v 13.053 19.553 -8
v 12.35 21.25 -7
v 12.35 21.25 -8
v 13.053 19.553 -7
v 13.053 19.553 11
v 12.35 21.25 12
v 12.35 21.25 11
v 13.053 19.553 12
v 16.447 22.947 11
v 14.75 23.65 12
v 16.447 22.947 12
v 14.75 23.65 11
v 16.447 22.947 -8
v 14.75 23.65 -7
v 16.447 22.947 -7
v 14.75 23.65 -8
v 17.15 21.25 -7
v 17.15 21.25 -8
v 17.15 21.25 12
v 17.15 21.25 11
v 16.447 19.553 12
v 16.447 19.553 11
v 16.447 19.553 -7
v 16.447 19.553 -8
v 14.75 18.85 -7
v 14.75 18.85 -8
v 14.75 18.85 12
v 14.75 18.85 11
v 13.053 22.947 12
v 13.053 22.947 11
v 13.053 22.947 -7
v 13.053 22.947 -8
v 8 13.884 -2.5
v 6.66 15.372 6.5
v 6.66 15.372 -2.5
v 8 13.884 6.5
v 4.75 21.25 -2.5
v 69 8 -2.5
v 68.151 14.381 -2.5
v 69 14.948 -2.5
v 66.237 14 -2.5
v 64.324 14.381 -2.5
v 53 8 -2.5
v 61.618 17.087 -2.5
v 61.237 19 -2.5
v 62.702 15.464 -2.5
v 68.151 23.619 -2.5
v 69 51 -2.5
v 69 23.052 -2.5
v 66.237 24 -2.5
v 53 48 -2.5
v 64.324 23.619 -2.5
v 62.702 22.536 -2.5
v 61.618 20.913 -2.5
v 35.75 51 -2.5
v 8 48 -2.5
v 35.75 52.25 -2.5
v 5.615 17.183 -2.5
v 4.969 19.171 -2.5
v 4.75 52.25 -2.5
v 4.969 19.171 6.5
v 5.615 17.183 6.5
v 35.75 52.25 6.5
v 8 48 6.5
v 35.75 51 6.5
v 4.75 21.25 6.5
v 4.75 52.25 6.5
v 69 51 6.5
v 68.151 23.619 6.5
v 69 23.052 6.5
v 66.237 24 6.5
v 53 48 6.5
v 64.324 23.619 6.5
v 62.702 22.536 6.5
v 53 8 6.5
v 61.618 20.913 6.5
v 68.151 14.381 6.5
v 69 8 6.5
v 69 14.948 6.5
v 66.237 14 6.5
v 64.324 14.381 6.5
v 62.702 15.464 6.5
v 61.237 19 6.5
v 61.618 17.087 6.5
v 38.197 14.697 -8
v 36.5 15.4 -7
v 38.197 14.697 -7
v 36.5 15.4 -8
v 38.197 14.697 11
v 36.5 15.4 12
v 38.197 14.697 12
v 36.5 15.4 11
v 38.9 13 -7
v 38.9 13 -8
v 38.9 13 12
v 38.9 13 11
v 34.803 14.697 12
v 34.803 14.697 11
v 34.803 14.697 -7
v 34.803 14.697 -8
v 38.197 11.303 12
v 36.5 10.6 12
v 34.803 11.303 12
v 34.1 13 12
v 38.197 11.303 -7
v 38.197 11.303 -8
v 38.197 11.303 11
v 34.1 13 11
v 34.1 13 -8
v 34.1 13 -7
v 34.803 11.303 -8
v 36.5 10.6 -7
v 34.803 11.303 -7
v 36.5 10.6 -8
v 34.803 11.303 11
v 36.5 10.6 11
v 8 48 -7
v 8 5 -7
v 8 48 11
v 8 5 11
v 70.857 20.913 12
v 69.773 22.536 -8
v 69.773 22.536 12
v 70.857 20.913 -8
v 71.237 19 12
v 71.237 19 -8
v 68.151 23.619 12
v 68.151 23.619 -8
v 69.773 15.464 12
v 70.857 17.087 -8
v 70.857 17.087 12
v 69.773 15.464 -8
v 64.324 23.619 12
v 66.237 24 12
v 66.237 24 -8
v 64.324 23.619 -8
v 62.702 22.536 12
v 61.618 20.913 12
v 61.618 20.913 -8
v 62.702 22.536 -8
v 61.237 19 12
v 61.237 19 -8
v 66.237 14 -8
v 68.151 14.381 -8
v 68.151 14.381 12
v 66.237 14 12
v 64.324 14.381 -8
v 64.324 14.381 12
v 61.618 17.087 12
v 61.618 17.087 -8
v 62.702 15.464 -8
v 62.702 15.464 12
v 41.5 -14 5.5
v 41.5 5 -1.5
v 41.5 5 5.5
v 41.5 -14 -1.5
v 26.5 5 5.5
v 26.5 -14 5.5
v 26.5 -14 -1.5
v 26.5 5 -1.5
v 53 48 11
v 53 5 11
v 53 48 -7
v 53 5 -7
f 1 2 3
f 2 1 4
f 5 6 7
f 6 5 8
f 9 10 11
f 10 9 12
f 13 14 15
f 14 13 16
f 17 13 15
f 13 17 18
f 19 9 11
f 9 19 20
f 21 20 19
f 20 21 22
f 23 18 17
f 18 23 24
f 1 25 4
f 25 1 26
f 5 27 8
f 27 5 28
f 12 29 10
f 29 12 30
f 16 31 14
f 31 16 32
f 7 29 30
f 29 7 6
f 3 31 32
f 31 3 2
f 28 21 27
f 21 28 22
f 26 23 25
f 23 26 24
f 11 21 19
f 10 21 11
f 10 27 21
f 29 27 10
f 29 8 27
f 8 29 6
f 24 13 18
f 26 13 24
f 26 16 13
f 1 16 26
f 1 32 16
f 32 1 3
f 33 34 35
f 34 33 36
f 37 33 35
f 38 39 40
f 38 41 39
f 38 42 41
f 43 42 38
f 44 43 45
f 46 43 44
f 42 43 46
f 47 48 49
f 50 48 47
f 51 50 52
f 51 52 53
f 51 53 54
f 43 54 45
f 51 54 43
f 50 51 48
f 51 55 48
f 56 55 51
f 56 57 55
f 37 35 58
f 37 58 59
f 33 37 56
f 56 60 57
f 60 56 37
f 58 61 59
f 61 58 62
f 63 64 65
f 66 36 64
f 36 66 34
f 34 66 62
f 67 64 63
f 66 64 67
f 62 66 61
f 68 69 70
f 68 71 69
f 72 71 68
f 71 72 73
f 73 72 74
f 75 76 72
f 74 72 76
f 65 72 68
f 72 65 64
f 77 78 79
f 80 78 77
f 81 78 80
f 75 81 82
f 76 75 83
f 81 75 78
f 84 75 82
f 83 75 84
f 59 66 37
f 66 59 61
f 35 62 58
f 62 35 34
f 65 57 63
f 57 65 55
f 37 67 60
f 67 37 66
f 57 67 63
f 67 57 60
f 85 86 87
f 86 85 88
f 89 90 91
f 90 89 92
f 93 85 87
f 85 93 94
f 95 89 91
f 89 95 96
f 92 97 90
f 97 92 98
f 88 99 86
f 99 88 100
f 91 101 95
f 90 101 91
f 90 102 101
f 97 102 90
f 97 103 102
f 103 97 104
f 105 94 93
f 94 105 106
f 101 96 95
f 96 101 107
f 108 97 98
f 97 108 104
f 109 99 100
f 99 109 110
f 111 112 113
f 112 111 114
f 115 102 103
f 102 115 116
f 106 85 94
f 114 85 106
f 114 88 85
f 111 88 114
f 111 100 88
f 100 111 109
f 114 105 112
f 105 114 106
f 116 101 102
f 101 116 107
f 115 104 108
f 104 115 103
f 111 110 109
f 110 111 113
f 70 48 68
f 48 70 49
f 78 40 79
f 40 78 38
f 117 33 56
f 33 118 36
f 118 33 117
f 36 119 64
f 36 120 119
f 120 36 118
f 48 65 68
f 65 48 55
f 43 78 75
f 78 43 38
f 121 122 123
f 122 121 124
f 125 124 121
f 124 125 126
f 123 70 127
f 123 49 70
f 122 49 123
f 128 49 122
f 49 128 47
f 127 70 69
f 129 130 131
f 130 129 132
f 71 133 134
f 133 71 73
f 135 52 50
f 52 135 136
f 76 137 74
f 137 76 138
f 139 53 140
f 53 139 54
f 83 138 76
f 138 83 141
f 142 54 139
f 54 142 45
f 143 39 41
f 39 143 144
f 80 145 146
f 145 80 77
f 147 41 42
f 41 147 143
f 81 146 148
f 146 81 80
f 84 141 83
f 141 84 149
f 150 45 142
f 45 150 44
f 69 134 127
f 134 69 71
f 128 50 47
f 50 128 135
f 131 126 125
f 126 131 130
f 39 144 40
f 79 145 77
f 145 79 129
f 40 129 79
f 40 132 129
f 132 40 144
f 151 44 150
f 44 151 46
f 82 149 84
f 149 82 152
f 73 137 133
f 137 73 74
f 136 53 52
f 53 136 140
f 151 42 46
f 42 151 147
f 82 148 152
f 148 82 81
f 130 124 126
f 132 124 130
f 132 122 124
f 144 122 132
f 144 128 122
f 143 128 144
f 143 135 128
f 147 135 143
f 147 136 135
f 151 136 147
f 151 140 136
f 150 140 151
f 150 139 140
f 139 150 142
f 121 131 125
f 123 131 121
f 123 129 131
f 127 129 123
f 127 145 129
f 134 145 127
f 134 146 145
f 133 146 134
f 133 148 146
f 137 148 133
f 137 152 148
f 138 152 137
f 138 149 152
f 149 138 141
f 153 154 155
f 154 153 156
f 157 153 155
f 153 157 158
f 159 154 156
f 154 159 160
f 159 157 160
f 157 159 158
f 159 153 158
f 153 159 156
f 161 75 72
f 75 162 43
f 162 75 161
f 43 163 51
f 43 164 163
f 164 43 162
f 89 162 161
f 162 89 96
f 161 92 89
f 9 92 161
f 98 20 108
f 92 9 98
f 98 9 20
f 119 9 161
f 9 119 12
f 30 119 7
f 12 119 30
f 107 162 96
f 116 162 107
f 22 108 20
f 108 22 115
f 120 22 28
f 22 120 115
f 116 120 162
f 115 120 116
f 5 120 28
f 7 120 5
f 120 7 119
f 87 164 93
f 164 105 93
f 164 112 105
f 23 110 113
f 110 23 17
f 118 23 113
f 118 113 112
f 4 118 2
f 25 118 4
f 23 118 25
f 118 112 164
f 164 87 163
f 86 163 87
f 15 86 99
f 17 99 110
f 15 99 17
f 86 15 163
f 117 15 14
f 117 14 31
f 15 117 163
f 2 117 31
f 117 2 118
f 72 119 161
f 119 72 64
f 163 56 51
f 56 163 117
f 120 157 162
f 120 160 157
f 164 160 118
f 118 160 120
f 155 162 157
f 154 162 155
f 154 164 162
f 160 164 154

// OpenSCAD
module AR15_Trigger(pinWidth=20,
                   triggerPin=true, hammerPin=true,
                   selector=true,
                   triggerHole=false,
                   triggerPocketModifier=0) {

  pinRadius = 2.4; // 0.1560*25.4/2;

  frontPinOffsetX = 6.75;
  frontPinOffsetY = 16.25;

  rearPinOffsetX = 28.5;
  rearPinOffsetY = 8;

  selectorRadius = 5; // Diameter: .3760" = 9.55mm
  selectorOffsetX = frontPinOffsetX+(1.968*25.4) + 1.5;
  selectorOffsetY = 14;

  hammerLength = 41 + triggerPocketModifier;
  hammerWidth  = 9  + triggerPocketModifier;
  hammerPivotRadius = 10 + triggerPocketModifier;

  triggerWidth      = 7;

  triggerPocketHeight = 43 + triggerPocketModifier;
  triggerPocketWidth  = 18 + triggerPocketModifier;
  triggerPocketLength = 45 + triggerPocketModifier;

  render()
  translate([0,0,0])
  //rotate([90,0,0])
  difference() {
    union() {

      // Trigger pack body
      translate([0,0,-triggerPocketWidth/2])
      cube([triggerPocketLength,triggerPocketHeight,triggerPocketWidth]);

      translate([0,0,0]) {

        // Pins and hammer path
        translate([frontPinOffsetX,frontPinOffsetY,0]) {

          // Hammer pin
          if (hammerPin)
          cylinder(r=pinRadius, h=pinWidth, center=true);

          // Hammer pivot
          cylinder(r=hammerPivotRadius, h=hammerWidth, center=true);

          // Hammer travel
          translate([-hammerPivotRadius,0,-hammerWidth/2])
          cube([hammerLength-hammerPivotRadius,hammerLength-hammerPivotRadius,hammerWidth]);
        };

        // Trigger pin
        if (triggerPin)
        translate([rearPinOffsetX,rearPinOffsetY,0])
        cylinder(r=pinRadius, h=pinWidth, center=true);

        // Sear Extension
        translate([0,3,0-hammerWidth/2])
        cube([triggerPocketLength+16,triggerPocketHeight,hammerWidth]);

        // Selector
        if (selector)
        translate([selectorOffsetX,selectorOffsetY,0])
        cylinder(r=selectorRadius, h=pinWidth, center=true);

        // Trigger
        translate([rearPinOffsetX - 10,-19,-3.5])
        cube([15,20,7]);
      }
    }

    if (triggerHole) {
      //translate([0,0,triggerPocketWidth/2])
      translate([rearPinOffsetX - 10,-19,-3.5])
      cube([15,40+triggerPocketHeight,7]);
    }
  }
}

translate([8,5,2])
AR15_Trigger();
